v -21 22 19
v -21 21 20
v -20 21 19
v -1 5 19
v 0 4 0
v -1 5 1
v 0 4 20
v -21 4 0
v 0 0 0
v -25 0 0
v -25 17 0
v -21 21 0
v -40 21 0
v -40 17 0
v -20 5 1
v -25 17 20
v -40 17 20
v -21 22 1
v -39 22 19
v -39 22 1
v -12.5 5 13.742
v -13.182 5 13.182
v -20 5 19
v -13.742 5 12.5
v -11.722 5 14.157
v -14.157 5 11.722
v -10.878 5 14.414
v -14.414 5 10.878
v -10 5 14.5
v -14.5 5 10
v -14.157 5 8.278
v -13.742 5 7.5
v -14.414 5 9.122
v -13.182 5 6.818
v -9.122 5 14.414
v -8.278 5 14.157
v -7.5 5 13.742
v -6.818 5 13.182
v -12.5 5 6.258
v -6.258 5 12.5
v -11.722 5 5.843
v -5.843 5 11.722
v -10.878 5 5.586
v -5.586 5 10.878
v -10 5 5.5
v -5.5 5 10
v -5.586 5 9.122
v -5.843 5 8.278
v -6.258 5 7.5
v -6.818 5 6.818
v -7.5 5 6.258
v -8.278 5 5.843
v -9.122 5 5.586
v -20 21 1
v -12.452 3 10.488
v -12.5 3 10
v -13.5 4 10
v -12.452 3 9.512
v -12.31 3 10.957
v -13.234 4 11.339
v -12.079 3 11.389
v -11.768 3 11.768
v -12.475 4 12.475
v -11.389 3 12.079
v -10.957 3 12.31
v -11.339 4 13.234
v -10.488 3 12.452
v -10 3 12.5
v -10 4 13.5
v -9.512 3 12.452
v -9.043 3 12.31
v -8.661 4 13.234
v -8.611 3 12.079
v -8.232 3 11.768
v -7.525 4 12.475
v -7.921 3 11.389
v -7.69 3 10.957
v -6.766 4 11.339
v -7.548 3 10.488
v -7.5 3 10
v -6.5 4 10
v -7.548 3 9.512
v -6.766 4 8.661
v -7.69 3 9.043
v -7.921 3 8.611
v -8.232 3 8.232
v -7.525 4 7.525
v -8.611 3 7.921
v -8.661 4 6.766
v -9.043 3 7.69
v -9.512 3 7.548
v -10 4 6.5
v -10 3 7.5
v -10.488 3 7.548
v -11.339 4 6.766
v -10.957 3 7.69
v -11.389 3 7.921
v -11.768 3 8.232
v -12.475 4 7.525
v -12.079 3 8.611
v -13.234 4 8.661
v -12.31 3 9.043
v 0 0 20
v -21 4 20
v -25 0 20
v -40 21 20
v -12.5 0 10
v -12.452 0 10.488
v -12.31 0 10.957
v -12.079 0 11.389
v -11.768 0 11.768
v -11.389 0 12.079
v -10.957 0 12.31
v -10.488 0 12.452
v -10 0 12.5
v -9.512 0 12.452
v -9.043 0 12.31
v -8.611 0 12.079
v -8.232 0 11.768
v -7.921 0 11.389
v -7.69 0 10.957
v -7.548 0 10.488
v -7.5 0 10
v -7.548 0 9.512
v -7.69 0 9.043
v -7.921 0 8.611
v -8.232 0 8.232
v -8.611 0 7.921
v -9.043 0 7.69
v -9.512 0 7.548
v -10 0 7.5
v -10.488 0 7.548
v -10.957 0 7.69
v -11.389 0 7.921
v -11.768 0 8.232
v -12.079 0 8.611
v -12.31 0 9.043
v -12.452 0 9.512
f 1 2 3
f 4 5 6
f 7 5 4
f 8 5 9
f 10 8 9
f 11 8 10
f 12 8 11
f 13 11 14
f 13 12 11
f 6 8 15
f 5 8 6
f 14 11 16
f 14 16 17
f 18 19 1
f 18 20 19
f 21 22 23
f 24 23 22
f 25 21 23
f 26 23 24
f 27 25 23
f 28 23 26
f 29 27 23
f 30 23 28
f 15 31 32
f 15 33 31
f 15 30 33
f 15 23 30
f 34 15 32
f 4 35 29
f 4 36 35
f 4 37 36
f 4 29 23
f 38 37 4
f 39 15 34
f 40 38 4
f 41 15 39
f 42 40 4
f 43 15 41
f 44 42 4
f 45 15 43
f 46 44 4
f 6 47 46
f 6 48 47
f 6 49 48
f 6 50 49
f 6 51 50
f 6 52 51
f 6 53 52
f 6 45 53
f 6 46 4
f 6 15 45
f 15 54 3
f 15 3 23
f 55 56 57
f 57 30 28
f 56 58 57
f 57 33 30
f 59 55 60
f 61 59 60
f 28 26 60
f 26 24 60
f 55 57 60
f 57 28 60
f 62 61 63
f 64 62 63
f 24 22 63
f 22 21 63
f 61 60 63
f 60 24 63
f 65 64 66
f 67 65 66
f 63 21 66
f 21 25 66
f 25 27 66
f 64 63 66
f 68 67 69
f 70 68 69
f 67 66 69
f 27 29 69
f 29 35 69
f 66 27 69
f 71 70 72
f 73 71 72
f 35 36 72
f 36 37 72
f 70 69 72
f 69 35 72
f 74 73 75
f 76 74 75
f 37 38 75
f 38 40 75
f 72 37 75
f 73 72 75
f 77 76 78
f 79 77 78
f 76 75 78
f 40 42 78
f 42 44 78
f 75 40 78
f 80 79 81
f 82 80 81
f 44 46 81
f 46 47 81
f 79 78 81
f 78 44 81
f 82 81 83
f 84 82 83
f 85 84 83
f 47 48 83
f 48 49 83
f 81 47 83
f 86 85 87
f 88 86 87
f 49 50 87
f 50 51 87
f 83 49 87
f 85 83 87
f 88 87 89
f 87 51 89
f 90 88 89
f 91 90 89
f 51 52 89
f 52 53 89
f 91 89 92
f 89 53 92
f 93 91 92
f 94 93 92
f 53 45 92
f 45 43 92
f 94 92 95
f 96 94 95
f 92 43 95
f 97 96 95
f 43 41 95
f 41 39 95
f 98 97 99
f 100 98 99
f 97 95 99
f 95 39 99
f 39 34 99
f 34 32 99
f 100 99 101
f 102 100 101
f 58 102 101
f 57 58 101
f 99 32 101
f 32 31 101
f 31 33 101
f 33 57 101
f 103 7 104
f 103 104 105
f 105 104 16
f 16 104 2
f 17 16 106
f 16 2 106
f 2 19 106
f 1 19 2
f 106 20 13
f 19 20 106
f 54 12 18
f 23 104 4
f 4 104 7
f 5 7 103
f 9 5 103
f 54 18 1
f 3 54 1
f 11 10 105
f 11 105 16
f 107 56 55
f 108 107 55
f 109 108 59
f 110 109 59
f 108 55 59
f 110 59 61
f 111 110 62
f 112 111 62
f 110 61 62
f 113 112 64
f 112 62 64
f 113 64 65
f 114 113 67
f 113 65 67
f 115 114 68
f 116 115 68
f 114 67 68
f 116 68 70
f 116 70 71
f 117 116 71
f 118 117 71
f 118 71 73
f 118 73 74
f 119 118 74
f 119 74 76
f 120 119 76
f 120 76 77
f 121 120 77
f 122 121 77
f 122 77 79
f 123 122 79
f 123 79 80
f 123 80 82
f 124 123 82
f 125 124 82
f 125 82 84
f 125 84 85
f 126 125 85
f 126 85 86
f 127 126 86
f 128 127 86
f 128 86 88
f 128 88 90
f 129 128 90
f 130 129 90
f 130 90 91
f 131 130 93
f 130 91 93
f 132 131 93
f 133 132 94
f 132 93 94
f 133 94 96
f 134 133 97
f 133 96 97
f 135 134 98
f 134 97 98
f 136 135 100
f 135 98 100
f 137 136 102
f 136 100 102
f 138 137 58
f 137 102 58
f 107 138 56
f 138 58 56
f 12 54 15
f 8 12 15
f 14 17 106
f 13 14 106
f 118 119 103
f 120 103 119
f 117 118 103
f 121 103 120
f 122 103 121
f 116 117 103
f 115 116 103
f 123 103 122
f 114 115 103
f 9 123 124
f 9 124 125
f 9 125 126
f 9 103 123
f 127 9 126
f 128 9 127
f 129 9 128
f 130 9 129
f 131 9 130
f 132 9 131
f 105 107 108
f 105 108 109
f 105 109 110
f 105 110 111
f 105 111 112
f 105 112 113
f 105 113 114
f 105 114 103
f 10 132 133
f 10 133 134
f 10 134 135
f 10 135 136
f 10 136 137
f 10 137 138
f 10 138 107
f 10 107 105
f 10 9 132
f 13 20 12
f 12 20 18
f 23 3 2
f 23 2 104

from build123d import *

# Parameters (mm, degrees)
PAD_DEPTH       = 20
SKETCH001_R     = 2.5
POCKET_DEPTH    = 5.001
CHAMFER_SIZE    = 2
CHAMFER001_SIZE = 1


with BuildPart() as part:
    # Sketch → Pad (new body)
    with BuildSketch(Plane.XY):
        Polygon((0, 0), (-25, 0), (-25, 17), (-40, 17), (-40, 22), (-20, 22), (-20, 5), (0, 5), align=None)
    extrude(amount=PAD_DEPTH)

    # Sketch001 (on Face7 of Pad) → Pocket (cut, through all)
    with BuildSketch(Plane(origin=(0, 5, 0), x_dir=(-1, 0, 0), z_dir=(0, 1, 0))):
        with Locations((10, 10)):
            Circle(SKETCH001_R)
    extrude(amount=-POCKET_DEPTH, mode=Mode.SUBTRACT)

    # Chamfer
    chamfer_edges = [part.edges().sort_by_distance(p)[0] for p in [
        (-7.5, 5, 10),
    ]]
    chamfer(chamfer_edges, length=CHAMFER_SIZE)

    # Chamfer001
    chamfer001_edges = [part.edges().sort_by_distance(p)[0] for p in [
        (-10, 5, 0),
        (0, 5, 10),
        (-10, 5, 20),
        (-30, 22, 20),
        (-40, 22, 10),
        (-30, 22, 0),
        (-20, 13.5, 0),
        (-20, 13.5, 20),
        (-20, 22, 10),
    ]]
    chamfer(chamfer001_edges, length=CHAMFER001_SIZE)


solid = part.part
